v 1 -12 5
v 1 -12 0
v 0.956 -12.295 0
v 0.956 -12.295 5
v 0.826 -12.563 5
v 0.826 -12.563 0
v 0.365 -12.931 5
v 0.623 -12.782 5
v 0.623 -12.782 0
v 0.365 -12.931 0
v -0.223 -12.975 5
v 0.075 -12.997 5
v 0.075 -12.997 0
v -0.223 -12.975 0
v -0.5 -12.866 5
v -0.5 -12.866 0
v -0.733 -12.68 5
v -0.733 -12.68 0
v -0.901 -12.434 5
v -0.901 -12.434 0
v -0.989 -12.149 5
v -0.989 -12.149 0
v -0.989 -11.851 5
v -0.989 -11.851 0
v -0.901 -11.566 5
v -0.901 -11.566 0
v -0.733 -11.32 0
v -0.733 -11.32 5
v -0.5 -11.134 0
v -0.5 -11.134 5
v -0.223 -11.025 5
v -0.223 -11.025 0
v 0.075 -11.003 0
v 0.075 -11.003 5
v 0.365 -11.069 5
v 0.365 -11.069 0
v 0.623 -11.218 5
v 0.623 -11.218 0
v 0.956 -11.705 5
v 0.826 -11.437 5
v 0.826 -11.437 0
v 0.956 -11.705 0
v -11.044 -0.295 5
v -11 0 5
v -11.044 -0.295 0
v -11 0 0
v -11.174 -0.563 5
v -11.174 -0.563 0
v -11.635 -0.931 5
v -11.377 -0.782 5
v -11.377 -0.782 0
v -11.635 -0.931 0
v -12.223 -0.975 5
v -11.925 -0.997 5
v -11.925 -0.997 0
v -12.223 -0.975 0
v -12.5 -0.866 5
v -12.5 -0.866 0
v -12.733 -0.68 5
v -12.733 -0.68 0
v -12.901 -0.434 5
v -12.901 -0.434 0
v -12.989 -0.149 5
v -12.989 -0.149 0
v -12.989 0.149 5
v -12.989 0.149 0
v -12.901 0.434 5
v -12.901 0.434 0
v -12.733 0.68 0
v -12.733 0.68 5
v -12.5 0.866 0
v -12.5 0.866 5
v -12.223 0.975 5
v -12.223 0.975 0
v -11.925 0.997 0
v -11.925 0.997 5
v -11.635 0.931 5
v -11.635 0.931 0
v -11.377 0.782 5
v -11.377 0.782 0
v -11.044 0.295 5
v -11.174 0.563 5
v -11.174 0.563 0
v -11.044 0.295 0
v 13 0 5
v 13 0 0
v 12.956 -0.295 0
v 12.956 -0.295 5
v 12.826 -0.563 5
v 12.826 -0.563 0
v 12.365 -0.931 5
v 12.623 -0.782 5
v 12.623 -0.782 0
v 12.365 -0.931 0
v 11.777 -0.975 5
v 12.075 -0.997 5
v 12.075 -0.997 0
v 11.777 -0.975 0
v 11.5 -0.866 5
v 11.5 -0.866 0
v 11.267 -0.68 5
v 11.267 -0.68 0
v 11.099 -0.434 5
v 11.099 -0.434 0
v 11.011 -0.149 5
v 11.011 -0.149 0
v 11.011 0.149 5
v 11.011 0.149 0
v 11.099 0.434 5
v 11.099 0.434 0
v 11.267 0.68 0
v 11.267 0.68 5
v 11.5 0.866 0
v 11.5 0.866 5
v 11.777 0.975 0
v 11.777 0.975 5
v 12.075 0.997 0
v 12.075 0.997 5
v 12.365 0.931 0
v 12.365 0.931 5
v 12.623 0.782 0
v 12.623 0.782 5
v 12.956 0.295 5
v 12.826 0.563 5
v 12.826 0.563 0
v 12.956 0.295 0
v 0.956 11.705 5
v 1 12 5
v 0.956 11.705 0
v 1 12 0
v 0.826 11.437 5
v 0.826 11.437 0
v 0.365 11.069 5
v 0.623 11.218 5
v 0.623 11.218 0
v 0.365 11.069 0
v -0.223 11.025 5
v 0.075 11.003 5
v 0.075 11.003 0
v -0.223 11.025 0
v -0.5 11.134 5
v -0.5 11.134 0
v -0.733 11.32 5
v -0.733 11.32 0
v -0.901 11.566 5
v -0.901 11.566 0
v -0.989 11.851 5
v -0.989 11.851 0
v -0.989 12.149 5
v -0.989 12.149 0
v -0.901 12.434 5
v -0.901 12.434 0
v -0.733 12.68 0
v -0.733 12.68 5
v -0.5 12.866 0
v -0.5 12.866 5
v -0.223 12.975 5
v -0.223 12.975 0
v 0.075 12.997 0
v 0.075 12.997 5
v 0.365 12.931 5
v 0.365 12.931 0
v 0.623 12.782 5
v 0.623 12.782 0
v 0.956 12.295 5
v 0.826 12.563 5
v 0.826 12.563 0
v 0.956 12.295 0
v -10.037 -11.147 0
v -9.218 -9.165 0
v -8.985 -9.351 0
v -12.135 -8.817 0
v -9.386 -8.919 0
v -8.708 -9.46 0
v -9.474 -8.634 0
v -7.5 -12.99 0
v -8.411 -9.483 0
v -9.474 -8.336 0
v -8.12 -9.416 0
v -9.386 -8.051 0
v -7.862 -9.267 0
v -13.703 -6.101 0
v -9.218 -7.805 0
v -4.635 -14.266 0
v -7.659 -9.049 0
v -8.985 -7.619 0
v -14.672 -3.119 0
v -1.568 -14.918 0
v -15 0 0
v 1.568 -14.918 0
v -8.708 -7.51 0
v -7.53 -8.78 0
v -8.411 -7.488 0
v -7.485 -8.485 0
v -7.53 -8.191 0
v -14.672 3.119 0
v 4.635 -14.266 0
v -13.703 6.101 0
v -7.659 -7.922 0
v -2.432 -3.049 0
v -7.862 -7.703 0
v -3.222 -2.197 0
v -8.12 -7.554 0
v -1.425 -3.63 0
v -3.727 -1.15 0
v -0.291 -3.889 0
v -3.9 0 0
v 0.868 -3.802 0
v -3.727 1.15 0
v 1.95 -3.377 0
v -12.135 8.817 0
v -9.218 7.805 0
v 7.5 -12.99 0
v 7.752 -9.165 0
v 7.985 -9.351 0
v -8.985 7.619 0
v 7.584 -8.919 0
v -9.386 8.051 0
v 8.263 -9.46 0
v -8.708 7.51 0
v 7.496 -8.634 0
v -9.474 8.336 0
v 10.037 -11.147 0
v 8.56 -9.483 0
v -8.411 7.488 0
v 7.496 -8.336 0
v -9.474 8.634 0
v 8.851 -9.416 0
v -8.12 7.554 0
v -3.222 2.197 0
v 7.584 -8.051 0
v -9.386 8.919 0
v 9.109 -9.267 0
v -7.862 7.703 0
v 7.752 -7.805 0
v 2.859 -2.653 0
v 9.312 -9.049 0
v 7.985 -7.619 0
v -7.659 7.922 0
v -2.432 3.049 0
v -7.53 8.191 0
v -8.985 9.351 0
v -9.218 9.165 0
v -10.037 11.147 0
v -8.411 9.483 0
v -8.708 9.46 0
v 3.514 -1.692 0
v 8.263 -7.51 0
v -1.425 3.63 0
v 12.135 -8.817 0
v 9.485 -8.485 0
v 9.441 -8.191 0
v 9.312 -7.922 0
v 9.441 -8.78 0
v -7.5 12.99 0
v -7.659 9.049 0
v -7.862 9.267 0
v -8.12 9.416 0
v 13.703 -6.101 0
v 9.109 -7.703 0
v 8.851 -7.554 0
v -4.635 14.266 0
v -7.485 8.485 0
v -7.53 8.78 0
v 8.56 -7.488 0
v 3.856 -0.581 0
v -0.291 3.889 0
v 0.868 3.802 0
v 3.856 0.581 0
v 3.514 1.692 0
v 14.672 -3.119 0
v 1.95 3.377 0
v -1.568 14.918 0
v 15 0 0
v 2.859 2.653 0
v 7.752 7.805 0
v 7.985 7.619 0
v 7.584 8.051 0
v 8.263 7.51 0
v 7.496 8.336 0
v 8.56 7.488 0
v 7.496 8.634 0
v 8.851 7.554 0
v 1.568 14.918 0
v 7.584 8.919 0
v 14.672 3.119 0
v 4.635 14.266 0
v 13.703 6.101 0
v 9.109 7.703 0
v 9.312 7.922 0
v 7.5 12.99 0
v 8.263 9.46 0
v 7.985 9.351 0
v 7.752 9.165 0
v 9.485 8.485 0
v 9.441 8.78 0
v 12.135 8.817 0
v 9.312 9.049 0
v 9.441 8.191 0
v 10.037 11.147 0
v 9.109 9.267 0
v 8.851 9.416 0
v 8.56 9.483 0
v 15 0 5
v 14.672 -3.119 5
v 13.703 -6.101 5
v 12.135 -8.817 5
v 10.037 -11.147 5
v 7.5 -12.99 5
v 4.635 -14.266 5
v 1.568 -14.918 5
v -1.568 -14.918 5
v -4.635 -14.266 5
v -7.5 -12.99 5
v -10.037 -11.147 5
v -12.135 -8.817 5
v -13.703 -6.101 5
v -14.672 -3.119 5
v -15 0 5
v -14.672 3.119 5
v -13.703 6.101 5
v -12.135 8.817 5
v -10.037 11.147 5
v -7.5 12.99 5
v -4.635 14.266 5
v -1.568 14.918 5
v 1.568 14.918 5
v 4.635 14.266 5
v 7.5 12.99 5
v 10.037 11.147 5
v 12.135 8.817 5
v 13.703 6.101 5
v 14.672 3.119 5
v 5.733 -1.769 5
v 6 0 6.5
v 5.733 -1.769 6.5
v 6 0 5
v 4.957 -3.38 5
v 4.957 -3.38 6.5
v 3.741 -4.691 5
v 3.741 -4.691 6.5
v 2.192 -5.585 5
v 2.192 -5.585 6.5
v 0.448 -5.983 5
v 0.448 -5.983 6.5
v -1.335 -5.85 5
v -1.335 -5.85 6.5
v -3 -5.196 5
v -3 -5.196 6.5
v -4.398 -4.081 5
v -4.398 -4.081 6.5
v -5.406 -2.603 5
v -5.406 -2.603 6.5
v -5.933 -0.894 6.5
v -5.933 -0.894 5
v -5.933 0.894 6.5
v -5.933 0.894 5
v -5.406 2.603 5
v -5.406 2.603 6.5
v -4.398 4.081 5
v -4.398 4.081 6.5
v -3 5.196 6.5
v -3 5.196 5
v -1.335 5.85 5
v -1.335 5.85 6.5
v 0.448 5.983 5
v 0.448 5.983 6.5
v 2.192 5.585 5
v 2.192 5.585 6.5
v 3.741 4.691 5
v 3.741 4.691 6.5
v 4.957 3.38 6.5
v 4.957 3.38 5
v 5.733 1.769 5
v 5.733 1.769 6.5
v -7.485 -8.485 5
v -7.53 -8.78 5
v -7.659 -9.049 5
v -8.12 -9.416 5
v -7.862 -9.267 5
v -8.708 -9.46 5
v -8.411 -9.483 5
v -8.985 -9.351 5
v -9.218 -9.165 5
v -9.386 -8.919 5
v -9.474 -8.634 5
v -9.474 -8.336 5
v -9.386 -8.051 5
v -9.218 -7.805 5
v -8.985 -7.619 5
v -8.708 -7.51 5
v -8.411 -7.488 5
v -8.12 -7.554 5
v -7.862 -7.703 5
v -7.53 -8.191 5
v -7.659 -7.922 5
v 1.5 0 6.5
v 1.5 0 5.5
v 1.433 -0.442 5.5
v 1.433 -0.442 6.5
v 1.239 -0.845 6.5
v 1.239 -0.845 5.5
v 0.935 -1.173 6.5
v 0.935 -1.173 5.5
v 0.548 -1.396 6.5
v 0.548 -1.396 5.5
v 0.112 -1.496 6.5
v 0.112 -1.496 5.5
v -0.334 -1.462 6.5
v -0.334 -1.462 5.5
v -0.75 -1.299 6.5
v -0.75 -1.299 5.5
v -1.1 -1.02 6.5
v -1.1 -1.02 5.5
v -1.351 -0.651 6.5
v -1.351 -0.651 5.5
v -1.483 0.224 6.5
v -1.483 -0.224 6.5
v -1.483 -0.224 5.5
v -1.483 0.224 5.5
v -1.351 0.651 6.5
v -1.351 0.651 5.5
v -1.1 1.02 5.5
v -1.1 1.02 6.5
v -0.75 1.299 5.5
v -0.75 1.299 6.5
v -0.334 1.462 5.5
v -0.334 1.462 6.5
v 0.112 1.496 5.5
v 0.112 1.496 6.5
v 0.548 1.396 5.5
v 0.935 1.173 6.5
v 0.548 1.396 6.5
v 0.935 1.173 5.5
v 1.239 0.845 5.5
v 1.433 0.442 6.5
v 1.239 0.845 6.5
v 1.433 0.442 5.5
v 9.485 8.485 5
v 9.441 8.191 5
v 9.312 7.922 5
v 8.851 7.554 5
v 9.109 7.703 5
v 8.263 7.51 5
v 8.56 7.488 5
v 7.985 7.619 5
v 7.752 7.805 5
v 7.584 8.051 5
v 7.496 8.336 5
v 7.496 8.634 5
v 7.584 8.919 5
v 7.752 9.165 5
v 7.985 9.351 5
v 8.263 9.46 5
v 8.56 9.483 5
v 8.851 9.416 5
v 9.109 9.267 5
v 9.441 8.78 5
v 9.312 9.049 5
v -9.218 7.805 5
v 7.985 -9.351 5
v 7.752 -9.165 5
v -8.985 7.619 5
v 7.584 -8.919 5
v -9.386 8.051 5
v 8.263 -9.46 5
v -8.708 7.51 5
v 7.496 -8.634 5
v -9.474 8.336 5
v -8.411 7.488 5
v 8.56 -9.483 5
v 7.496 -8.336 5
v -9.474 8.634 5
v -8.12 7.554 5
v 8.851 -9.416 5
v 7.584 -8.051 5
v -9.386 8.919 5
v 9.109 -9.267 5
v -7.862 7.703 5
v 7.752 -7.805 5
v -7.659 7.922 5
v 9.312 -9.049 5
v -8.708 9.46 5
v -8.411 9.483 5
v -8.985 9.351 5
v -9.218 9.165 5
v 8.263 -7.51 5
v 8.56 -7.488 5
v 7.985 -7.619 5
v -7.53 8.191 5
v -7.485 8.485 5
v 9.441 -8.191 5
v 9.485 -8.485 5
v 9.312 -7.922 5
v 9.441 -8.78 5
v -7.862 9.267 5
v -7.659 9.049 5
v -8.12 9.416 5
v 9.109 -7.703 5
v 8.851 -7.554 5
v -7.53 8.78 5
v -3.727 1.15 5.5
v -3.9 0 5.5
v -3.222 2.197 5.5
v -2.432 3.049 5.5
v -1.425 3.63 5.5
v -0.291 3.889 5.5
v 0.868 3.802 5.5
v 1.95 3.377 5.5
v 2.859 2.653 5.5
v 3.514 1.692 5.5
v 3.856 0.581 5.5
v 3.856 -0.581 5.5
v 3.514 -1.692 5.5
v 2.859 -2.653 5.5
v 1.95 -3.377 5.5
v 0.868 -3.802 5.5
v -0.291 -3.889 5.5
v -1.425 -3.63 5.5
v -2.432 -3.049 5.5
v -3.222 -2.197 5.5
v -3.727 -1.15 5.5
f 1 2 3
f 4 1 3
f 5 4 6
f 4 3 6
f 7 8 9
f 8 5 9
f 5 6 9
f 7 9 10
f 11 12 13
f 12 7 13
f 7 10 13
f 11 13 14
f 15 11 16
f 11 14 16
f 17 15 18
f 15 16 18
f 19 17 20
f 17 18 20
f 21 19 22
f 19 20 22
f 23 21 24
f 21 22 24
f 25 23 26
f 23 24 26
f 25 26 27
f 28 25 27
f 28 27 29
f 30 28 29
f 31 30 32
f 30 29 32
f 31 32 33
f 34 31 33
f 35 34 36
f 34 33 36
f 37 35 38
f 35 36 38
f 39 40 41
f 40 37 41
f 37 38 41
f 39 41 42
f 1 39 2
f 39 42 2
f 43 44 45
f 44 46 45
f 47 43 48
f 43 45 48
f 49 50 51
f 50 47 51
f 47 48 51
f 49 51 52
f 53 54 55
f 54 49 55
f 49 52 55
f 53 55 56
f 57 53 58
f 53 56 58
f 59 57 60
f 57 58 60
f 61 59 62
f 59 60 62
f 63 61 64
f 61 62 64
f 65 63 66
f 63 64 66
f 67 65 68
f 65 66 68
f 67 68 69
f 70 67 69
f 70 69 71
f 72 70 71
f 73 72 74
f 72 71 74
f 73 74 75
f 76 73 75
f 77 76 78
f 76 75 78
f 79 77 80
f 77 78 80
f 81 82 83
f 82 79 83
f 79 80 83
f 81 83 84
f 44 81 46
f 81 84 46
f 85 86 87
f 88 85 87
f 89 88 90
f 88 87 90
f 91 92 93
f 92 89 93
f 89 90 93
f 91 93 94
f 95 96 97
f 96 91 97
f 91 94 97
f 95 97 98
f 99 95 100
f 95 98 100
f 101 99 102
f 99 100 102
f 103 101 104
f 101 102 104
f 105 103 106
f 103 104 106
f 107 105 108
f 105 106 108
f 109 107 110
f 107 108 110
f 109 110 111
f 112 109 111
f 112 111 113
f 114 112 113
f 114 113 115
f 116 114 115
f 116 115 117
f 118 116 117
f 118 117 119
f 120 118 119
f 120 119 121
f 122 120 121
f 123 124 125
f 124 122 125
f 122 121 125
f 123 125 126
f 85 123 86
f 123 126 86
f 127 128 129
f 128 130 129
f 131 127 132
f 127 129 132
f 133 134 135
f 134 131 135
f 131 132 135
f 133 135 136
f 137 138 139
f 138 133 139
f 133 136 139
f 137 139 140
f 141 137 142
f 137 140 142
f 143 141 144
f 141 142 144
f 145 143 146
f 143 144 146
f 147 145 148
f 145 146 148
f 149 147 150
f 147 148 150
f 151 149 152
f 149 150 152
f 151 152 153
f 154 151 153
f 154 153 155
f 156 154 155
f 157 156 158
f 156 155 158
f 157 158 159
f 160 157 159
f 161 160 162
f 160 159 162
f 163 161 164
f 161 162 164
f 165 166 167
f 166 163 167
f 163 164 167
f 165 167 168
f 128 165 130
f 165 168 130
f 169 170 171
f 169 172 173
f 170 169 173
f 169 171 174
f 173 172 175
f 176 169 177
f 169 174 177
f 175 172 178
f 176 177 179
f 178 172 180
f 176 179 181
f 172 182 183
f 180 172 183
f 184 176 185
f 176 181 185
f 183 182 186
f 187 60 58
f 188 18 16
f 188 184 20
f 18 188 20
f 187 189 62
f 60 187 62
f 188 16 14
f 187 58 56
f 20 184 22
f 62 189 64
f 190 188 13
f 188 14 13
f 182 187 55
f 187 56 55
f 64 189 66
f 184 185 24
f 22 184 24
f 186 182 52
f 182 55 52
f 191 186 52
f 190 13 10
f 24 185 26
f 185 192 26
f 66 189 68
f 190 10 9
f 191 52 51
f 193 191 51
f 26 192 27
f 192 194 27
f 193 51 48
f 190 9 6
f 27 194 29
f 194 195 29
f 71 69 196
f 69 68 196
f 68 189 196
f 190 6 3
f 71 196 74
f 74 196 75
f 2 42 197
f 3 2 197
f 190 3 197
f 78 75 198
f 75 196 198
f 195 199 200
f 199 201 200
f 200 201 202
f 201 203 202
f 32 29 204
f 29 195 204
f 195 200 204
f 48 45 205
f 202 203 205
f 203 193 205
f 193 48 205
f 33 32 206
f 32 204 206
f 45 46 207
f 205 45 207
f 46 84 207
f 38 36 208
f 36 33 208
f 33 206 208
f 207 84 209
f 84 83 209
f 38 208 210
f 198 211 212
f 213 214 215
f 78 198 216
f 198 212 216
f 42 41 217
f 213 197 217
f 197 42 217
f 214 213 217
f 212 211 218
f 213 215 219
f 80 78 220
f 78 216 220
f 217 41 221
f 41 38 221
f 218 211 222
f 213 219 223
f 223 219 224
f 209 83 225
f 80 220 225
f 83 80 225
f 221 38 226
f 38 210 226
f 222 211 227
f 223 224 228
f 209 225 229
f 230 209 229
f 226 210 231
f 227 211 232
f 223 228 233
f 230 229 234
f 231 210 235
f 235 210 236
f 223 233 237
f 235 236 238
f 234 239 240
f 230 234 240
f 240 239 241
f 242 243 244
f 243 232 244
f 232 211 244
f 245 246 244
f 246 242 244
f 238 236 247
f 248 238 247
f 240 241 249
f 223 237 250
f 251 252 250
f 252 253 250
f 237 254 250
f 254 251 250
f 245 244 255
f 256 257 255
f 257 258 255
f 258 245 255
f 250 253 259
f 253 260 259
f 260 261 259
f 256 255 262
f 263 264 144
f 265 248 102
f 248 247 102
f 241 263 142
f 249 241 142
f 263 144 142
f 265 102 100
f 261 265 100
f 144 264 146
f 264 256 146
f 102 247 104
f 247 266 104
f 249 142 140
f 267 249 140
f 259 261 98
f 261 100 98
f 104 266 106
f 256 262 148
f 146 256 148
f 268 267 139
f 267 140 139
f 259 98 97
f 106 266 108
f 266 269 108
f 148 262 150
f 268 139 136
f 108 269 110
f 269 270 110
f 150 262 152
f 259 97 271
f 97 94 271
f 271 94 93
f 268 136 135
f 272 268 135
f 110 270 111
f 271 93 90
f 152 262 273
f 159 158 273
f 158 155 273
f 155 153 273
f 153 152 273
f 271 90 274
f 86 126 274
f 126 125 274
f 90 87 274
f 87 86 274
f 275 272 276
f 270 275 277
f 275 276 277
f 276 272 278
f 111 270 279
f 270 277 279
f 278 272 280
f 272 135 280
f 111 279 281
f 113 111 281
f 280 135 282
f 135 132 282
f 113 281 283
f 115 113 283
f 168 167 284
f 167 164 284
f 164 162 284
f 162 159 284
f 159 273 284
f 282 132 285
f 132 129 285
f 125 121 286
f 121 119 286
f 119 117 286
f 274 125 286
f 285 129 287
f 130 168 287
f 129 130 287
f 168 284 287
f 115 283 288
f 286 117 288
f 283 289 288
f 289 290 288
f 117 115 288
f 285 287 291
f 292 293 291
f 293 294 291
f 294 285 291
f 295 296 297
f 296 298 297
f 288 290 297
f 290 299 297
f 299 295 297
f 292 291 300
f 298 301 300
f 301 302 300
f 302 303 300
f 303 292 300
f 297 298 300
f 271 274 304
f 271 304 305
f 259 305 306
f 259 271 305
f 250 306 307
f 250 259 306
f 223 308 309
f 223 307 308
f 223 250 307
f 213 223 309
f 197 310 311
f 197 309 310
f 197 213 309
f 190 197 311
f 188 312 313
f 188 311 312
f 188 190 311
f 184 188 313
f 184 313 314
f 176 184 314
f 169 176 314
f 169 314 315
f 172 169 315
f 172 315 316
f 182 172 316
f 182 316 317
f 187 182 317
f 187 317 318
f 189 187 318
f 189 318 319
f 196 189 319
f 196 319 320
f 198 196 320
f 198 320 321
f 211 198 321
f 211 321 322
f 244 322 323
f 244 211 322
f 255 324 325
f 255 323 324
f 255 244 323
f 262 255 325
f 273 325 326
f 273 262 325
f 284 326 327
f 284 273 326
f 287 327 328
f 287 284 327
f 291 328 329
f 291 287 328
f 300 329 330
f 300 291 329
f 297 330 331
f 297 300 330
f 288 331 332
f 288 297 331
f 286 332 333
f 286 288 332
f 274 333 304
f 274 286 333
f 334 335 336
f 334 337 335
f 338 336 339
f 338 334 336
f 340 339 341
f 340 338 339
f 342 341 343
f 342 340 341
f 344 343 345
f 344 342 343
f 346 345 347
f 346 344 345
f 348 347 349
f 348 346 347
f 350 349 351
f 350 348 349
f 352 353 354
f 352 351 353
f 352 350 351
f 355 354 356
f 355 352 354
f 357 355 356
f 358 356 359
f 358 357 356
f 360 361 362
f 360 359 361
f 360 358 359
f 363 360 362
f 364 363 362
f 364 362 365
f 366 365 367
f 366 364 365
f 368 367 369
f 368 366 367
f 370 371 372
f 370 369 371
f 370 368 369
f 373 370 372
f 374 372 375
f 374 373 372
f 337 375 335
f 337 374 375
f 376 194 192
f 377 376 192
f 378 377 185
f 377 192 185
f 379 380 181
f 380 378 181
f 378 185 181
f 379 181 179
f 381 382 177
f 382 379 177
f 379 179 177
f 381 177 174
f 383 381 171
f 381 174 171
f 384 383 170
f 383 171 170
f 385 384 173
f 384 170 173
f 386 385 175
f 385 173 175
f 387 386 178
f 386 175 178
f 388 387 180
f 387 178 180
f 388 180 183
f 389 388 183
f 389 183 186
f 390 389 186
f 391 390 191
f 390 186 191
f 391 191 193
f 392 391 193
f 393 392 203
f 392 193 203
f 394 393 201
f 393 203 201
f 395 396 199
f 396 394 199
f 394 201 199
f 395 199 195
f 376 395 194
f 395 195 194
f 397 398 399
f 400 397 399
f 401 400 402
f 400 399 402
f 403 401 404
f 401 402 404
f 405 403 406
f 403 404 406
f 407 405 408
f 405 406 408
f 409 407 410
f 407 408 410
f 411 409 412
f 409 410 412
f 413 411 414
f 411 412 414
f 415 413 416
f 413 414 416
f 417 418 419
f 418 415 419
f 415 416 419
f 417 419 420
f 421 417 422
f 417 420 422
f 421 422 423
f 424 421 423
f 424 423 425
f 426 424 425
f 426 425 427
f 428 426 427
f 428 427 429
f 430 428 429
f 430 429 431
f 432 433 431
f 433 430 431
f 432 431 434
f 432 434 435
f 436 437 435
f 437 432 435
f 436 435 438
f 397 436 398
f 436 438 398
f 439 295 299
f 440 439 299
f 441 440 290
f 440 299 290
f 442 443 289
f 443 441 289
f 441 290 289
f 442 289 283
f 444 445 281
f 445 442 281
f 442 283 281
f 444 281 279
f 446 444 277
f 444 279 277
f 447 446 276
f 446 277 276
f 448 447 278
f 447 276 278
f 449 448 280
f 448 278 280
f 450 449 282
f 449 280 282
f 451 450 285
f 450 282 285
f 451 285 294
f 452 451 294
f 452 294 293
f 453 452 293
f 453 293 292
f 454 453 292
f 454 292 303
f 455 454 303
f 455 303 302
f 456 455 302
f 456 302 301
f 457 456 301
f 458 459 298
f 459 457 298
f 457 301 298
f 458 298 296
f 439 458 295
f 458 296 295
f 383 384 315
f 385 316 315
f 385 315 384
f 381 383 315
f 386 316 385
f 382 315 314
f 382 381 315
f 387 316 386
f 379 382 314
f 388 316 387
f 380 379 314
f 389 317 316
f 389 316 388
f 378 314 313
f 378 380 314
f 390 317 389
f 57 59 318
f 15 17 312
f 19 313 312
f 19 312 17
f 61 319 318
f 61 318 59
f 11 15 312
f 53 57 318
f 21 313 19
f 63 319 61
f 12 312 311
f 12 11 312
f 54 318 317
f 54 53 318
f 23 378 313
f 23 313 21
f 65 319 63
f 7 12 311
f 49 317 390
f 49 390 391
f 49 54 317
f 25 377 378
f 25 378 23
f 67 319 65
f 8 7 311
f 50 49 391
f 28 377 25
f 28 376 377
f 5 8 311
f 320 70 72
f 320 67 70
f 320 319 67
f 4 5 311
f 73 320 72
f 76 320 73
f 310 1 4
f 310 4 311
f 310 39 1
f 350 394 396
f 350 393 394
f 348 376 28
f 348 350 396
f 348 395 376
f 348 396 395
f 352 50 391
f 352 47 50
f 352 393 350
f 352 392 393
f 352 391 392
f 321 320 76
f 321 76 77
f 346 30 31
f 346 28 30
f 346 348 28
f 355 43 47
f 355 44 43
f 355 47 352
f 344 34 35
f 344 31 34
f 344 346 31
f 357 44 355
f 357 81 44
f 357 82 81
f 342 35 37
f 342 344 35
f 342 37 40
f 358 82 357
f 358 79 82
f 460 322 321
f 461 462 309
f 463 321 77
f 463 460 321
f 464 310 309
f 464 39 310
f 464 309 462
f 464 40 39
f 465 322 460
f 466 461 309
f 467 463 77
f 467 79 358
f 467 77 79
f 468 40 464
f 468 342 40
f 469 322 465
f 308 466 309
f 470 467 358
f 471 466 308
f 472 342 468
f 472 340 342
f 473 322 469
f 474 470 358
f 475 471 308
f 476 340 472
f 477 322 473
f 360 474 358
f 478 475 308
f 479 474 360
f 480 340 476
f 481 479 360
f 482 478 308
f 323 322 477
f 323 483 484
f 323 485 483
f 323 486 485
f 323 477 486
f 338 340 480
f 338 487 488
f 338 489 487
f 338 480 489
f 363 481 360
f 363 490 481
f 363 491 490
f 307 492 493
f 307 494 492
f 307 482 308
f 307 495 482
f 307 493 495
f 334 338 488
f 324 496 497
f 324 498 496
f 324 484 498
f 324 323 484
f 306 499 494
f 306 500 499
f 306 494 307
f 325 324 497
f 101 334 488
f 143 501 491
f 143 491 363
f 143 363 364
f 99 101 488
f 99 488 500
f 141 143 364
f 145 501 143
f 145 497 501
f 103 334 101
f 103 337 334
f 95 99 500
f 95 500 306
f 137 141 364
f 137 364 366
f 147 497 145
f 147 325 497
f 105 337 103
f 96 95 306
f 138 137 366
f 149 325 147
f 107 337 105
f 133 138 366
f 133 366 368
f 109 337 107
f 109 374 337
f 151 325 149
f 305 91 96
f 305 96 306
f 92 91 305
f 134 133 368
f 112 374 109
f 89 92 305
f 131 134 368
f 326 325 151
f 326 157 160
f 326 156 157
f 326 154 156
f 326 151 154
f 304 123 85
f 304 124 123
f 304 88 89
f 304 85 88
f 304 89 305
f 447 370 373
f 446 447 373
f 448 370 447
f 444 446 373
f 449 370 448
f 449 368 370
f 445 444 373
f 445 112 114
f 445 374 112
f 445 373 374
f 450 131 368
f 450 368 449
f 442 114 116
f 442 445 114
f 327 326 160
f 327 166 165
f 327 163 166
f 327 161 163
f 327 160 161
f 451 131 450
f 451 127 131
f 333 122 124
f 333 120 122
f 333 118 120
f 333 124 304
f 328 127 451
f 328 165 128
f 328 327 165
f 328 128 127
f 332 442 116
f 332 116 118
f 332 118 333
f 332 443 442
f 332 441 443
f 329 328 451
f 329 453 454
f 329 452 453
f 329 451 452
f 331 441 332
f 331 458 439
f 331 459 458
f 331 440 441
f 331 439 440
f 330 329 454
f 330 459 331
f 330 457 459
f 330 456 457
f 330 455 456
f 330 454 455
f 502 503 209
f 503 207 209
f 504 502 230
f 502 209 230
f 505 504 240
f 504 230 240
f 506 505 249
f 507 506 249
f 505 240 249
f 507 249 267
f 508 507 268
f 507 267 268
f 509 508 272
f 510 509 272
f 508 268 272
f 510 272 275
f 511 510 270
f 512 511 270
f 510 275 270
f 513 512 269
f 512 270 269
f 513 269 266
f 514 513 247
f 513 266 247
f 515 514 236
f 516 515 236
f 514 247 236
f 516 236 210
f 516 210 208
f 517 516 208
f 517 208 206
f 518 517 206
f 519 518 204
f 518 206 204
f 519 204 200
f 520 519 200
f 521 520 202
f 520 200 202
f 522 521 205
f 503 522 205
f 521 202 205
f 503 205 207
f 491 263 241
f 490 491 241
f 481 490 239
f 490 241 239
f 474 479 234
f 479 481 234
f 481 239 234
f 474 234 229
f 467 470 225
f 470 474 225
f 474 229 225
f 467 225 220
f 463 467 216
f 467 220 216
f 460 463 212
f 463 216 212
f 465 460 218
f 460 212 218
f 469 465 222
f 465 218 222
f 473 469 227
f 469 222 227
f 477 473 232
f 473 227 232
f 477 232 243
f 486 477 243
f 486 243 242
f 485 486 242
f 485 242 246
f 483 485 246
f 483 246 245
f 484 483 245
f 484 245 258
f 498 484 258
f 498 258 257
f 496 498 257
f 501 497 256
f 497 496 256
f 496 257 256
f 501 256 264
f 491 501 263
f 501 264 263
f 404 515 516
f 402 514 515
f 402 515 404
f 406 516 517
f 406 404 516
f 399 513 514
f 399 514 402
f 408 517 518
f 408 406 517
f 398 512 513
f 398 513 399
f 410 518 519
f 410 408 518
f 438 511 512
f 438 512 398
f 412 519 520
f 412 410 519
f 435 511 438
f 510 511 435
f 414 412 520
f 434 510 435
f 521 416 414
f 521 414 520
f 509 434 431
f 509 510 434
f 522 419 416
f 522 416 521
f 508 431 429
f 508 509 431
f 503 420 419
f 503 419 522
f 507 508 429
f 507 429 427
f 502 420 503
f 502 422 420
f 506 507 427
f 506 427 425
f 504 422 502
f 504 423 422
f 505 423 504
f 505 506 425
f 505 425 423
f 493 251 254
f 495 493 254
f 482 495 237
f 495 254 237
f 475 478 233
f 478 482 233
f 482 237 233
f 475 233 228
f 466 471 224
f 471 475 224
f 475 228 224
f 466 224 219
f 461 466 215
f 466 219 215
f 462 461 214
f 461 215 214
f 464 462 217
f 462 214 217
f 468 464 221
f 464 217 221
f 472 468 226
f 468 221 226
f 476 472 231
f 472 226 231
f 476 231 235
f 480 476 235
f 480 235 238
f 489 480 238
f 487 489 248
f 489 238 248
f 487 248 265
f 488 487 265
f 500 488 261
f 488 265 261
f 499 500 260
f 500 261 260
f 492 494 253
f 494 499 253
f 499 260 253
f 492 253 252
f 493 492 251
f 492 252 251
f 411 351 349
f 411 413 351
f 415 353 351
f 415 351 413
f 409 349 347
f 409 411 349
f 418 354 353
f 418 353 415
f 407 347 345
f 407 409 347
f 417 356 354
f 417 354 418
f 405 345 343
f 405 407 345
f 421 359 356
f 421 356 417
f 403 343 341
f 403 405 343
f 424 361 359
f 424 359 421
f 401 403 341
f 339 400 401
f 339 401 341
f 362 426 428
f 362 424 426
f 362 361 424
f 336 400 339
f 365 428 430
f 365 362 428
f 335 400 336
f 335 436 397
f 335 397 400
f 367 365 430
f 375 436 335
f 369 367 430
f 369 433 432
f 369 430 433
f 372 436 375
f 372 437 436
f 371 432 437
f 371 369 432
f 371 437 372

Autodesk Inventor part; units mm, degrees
ref_plane "YZ Plane" through (0, 0, 0) normal (1, 0, 0) x (0, 1, 0)
ref_plane "XZ Plane" through (0, 0, 0) normal (0, 1, 0) x (-1, 0, 0)
ref_plane "XY Plane" through (0, 0, 0) normal (0, 0, 1) x (1, 0, 0)
sketch "Sketch1" plane through (0, 0, 0) normal (0, 0, 1) x (1, 0, 0)
  circle A0 centre (0, 0) radius 15
  circle A1 centre (0, 12) radius 1
  circle A2 centre (-8.4853, 8.4853) radius 1
  circle A3 centre (-12, 0) radius 1
  circle A4 centre (-8.4853, -8.4853) radius 1
  circle A5 centre (0, -12) radius 1
  circle A6 centre (8.4853, -8.4853) radius 1
  circle A7 centre (12, 0) radius 1
  circle A8 centre (8.4853, 8.4853) radius 1
  circle A9 centre (0, 0) radius 1.5
  dimension "d0" = 30
  dimension "d1" = 2
  dimension "d4" = 360
  dimension "d6" = 12
  dimension "d9" = 3
extrude "Extrusion1" add sketch "Sketch1" along normal blind 5
sketch "Sketch2" plane through (0, 0, 5) normal (0, 0, 1) x (1, 0, 0)
  point P0 (0, 0)
sketch "Sketch3" plane through (0, 0, 5) normal (0, 0, 1) x (1, 0, 0)
  circle A0 centre (0, 0) radius 6
  circle A1 centre (0, 0) radius 1.5 projected
  dimension "d10" = 12
extrude "Extrusion2" add sketch "Sketch3" along normal blind 1.5
sketch "Sketch4" plane through (0, 0, 0) normal (0, 0, -1) x (-1, 0, 0)
  circle A0 centre (0, 0) radius 1.5 projected
  circle A1 centre (0, 0) radius 3.9
  dimension "d13" = 7.8
extrude "Extrusion3" cut sketch "Sketch4" against normal blind 5.5
properties part number "orczyk serwa okrągły 02-1"
